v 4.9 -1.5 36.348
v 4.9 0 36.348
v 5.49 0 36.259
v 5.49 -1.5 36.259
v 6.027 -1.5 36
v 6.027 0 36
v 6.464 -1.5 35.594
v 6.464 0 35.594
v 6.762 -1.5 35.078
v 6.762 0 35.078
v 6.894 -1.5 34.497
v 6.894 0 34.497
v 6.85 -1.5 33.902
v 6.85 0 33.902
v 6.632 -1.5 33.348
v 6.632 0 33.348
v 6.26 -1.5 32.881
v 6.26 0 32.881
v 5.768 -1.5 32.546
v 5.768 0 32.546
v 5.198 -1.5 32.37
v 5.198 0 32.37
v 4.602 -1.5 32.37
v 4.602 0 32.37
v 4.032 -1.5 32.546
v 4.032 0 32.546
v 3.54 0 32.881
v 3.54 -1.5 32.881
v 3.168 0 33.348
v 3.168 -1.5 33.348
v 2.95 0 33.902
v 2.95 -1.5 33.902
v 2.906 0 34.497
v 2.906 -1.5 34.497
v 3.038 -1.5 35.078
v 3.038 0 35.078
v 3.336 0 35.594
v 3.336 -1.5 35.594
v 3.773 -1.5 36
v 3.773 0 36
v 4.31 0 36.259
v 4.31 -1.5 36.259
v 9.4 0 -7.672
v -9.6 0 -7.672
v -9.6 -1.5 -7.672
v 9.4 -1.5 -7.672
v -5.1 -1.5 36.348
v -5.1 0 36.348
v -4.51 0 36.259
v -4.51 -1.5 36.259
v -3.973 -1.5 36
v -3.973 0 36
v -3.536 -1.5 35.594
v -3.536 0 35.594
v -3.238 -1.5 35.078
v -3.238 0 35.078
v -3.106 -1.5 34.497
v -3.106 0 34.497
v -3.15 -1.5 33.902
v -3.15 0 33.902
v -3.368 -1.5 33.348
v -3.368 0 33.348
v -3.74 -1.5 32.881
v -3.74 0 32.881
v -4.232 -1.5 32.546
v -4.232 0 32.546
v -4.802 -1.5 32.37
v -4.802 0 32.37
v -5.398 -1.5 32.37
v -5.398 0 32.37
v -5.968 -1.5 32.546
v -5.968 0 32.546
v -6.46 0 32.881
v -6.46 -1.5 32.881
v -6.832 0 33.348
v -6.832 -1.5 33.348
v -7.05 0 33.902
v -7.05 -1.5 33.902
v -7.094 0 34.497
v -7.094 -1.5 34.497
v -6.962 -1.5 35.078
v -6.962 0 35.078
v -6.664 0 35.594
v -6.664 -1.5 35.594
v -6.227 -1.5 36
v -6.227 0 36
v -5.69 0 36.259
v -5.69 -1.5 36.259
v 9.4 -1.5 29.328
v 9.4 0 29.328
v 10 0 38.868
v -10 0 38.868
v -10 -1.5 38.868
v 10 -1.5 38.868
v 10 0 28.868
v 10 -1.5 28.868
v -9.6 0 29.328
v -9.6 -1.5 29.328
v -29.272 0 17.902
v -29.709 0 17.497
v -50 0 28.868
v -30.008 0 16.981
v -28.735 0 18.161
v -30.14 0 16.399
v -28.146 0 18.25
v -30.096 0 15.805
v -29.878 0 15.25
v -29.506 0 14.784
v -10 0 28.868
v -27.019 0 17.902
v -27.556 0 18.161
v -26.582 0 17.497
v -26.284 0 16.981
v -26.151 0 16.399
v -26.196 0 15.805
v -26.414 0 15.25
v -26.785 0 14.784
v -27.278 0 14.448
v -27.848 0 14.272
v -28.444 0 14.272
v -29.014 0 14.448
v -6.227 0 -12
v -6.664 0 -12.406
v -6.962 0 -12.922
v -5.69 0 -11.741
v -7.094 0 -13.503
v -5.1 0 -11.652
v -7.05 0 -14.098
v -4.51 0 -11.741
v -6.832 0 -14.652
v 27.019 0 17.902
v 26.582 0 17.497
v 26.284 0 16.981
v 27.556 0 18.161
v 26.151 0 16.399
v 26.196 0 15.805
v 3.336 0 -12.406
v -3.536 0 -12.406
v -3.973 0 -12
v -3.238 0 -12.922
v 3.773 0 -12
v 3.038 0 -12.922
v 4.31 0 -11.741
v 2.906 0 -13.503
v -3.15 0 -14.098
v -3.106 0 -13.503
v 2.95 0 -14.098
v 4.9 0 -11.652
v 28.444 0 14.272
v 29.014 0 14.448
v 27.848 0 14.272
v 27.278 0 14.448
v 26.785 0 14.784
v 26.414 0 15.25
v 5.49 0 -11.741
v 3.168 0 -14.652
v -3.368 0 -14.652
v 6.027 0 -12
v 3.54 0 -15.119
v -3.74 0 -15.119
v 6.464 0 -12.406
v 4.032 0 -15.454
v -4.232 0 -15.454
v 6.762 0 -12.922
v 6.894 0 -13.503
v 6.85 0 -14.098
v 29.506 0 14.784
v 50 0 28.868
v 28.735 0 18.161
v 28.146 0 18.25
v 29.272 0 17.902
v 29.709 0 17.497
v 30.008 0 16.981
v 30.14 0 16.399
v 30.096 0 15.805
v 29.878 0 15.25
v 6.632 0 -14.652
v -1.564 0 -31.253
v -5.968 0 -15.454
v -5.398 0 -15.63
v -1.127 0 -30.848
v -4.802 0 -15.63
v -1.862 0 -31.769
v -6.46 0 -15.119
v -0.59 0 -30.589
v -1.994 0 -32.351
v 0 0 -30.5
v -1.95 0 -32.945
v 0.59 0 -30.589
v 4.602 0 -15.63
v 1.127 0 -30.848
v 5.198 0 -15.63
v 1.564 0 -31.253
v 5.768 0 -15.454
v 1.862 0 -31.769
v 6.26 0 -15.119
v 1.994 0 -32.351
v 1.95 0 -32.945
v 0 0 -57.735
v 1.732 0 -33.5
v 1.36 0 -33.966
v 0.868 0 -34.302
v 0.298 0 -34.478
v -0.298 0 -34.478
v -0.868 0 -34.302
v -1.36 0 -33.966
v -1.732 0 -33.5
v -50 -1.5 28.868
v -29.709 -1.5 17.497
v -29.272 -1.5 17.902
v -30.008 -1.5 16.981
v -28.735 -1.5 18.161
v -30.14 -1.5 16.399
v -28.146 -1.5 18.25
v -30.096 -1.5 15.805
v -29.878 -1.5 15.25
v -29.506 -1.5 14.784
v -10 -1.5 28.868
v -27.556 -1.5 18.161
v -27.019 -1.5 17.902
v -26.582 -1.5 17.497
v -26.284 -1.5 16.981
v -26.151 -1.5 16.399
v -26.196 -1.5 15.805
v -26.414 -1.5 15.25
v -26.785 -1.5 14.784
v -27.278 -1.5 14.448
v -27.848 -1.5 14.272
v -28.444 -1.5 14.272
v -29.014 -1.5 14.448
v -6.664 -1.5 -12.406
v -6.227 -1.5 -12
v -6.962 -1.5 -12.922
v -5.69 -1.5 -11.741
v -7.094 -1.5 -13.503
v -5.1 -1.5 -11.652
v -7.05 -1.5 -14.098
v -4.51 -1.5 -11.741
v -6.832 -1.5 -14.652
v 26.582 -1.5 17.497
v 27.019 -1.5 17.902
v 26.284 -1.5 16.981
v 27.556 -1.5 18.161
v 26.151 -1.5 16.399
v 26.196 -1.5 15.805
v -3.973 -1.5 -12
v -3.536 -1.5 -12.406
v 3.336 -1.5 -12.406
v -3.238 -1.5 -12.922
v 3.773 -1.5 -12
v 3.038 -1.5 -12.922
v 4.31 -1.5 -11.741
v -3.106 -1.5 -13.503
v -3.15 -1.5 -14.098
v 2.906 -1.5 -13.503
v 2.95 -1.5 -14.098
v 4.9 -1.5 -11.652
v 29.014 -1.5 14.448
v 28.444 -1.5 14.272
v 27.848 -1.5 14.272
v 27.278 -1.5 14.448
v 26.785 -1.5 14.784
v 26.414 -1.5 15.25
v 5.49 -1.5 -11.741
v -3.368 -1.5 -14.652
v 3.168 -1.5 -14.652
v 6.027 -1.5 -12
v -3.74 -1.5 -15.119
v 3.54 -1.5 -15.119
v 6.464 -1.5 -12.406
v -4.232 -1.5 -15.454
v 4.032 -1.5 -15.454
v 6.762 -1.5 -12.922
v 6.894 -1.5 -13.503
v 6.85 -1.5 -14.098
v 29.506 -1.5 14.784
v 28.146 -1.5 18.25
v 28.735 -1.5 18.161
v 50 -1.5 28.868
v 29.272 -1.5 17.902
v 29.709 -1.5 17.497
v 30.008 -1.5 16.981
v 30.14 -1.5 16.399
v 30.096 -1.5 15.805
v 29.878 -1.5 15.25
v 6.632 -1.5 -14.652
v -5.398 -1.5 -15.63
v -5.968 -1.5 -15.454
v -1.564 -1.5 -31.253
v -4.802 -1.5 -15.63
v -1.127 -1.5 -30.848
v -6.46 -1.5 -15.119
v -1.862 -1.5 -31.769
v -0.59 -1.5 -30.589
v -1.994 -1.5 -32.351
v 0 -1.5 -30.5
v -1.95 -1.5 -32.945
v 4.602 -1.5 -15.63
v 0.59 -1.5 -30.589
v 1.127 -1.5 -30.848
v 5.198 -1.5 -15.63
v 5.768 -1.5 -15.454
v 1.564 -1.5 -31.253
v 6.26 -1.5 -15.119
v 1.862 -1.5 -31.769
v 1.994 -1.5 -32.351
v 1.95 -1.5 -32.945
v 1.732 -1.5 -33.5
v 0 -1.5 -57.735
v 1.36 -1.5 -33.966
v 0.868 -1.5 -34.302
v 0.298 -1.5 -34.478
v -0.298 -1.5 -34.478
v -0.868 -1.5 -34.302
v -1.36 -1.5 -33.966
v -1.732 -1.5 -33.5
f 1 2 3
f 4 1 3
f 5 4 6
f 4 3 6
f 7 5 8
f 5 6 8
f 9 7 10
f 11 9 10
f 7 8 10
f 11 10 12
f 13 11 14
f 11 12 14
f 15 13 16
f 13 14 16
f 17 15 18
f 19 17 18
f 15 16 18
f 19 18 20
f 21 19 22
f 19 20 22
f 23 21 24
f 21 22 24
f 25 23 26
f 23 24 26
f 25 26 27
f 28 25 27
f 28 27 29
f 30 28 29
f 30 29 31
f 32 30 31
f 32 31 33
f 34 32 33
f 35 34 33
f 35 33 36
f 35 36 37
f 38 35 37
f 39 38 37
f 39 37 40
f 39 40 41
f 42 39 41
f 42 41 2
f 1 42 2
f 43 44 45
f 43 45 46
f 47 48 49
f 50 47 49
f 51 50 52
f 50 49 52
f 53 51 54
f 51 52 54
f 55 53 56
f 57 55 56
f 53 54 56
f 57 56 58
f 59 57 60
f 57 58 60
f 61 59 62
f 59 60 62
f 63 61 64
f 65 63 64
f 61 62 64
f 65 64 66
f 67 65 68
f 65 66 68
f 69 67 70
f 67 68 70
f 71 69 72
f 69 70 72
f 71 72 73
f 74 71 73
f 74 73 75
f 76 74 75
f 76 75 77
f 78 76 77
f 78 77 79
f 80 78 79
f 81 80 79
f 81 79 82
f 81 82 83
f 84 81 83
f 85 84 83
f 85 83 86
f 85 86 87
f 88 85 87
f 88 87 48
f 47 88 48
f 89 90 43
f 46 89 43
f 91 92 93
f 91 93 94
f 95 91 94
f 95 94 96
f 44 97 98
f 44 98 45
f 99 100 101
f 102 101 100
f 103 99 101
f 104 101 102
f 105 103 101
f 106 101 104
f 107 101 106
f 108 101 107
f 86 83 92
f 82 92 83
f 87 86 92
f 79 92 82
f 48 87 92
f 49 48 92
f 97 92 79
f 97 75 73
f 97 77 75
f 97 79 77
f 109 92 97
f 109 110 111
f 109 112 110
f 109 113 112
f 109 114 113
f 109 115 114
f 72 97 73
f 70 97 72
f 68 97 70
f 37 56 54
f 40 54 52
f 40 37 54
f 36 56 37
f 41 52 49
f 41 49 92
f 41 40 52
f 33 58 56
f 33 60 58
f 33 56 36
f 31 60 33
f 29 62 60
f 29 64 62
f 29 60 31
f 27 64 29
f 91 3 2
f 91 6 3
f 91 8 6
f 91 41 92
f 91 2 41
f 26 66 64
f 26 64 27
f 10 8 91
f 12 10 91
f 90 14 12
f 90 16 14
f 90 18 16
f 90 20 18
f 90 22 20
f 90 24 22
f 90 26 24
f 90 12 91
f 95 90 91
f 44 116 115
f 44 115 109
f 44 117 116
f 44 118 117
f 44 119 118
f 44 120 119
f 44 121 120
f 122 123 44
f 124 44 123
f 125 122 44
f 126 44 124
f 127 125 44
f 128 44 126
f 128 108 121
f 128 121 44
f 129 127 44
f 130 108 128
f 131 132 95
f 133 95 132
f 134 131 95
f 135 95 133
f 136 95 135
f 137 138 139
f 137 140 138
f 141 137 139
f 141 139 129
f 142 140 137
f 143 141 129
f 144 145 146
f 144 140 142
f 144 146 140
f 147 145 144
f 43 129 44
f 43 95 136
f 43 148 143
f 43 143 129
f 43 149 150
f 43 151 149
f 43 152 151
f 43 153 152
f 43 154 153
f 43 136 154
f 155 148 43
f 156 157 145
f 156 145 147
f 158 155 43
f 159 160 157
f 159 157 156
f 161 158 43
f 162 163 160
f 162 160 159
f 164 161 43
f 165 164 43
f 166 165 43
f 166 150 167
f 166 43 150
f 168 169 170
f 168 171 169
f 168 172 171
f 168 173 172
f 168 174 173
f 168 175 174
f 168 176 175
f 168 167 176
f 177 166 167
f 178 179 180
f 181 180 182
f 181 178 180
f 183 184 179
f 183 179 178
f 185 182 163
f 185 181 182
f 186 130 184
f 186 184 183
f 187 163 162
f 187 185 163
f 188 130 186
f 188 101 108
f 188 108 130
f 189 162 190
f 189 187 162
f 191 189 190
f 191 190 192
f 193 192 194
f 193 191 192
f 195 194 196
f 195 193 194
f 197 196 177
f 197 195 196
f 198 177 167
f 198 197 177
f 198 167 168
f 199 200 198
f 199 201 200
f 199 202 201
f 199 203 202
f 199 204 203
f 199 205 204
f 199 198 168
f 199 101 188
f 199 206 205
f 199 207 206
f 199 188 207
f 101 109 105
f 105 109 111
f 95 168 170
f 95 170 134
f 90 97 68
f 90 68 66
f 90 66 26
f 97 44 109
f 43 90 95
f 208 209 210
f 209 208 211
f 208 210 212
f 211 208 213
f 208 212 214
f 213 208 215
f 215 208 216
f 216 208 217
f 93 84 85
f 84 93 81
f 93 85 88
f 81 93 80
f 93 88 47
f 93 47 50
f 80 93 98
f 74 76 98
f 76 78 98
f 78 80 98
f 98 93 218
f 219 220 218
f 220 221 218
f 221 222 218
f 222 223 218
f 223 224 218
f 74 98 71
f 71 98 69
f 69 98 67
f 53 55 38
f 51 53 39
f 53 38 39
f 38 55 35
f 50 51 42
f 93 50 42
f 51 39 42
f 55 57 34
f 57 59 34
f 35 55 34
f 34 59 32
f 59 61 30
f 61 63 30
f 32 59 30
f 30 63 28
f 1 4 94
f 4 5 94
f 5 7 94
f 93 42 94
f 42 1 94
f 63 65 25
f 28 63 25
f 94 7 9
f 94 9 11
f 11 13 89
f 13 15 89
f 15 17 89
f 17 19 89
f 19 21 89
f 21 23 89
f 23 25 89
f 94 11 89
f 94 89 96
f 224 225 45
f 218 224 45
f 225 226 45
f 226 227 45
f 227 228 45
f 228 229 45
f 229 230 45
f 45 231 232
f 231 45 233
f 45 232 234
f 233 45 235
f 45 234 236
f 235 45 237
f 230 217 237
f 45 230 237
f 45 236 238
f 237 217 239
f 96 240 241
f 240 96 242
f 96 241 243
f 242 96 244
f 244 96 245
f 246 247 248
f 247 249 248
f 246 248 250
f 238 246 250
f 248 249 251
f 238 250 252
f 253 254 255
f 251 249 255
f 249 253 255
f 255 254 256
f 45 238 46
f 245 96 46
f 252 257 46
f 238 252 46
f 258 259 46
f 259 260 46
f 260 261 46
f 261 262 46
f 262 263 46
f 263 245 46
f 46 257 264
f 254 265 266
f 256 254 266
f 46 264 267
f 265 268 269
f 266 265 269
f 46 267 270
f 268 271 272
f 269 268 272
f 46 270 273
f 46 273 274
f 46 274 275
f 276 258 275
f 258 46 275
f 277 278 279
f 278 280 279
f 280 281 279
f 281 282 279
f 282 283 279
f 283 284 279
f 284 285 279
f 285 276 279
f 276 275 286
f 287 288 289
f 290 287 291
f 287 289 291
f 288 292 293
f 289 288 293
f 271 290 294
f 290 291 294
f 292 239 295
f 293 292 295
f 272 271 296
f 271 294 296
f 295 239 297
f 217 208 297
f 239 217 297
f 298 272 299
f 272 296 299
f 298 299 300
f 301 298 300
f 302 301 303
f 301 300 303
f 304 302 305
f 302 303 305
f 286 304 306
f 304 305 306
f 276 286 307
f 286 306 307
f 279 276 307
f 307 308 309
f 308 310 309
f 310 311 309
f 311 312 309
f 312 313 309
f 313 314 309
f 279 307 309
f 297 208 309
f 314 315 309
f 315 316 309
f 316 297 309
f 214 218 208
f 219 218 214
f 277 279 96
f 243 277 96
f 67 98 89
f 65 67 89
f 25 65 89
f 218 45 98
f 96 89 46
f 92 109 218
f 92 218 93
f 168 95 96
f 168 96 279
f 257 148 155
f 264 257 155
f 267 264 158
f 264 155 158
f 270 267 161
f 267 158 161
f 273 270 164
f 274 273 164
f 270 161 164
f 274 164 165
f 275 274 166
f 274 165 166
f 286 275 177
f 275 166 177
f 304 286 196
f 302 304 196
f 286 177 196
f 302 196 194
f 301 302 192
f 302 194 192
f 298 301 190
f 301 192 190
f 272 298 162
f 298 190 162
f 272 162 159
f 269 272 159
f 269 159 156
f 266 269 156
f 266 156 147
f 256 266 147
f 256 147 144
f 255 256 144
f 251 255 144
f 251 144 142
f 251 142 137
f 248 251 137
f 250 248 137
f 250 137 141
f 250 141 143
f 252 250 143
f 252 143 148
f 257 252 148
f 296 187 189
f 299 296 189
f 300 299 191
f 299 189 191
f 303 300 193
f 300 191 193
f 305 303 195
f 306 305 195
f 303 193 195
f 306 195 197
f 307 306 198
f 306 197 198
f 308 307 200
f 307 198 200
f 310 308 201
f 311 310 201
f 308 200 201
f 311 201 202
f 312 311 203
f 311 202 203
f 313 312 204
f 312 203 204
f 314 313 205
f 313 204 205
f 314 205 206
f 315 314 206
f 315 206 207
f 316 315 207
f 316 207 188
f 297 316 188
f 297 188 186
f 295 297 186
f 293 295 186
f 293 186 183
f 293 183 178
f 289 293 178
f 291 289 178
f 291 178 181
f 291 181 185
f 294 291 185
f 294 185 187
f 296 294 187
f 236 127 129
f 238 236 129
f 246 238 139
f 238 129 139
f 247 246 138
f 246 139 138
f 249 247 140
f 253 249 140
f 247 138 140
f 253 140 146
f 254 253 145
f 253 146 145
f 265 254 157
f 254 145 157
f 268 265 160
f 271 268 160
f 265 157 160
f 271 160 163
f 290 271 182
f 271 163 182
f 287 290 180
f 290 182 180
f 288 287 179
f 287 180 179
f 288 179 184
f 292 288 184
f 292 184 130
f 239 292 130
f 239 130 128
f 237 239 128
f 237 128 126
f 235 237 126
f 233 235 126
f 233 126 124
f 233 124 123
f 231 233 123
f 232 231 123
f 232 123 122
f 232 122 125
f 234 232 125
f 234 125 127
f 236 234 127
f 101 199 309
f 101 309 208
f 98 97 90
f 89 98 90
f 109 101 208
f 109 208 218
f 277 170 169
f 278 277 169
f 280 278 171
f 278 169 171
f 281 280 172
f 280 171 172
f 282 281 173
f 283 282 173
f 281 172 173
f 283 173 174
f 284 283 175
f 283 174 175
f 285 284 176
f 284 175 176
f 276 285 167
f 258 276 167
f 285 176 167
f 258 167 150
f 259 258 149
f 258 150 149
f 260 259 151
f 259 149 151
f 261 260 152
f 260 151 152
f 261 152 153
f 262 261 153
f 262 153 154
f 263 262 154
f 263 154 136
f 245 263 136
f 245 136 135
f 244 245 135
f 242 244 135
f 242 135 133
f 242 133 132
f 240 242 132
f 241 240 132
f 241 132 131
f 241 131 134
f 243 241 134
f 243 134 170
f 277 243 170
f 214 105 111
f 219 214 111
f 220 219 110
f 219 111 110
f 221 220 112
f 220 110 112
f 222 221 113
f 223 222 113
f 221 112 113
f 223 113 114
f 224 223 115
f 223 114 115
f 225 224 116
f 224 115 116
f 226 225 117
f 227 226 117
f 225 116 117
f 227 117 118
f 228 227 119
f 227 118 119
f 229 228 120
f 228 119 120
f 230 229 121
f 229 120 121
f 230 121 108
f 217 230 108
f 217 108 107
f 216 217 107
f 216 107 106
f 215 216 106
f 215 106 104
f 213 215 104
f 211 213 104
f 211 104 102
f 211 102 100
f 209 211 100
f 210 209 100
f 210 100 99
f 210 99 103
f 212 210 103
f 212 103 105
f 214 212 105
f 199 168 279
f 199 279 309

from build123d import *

# Parameters (mm, degrees)
BASE_FLANGE1_DEPTH = 1.5
SKETCH6_R          = 2
CUT_EXTRUDE1_DEPTH = 10
SKETCH7_R          = 2
SKETCH7_W          = 19
SKETCH7_H          = 37
CUT_EXTRUDE2_DEPTH = 10


# Sheet-metal steps are written as plain solids
with BuildPart() as part:
    # Sketch1 → Base-Flange1 (new body)
    with BuildSketch(Plane(origin=(0, 0, 0), x_dir=(1, 0, 0), z_dir=(0, 1, 0))):
        Polygon((0, 57.735026919), (-50, -28.867513459), (-10, -28.867513459), (-10, -38.867513459), (10, -38.867513459), (10, -28.867513459), (50, -28.867513459), align=None)
    extrude(amount=-BASE_FLANGE1_DEPTH)

    # Sketch6 → Cut-Extrude1 (cut)
    with BuildSketch(Plane(origin=(0, 0, 0), x_dir=(1, 0, 0), z_dir=(0, 1, 0))):
        with Locations(Location((0, 32.5, 0), (0, 0, 270))):
            Circle(SKETCH6_R)
        with Locations(Location((28.145825623, -16.25, 0), (0, 0, 270))):
            Circle(SKETCH6_R)
        with Locations(Location((-28.145825623, -16.25, 0), (0, 0, 270))):
            Circle(SKETCH6_R)
    extrude(amount=-CUT_EXTRUDE1_DEPTH, mode=Mode.SUBTRACT)

    # Sketch7 → Cut-Extrude2 (cut)
    with BuildSketch(Plane(origin=(0, 0, 0), x_dir=(1, 0, 0), z_dir=(0, 1, 0))):
        with Locations(Location((-5.1, -34.347513459, 0), (0, 0, 270))):
            Circle(SKETCH7_R)
        with Locations(Location((4.9, -34.347513459, 0), (0, 0, 270))):
            Circle(SKETCH7_R)
        with Locations(Location((-5.1, 13.652486541, 0), (0, 0, 270))):
            Circle(SKETCH7_R)
        with Locations(Location((4.9, 13.652486541, 0), (0, 0, 270))):
            Circle(SKETCH7_R)
        with Locations((-0.1, -10.827513459)):
            Rectangle(SKETCH7_W, SKETCH7_H)
    extrude(amount=-CUT_EXTRUDE2_DEPTH, mode=Mode.SUBTRACT)


solid = part.part
